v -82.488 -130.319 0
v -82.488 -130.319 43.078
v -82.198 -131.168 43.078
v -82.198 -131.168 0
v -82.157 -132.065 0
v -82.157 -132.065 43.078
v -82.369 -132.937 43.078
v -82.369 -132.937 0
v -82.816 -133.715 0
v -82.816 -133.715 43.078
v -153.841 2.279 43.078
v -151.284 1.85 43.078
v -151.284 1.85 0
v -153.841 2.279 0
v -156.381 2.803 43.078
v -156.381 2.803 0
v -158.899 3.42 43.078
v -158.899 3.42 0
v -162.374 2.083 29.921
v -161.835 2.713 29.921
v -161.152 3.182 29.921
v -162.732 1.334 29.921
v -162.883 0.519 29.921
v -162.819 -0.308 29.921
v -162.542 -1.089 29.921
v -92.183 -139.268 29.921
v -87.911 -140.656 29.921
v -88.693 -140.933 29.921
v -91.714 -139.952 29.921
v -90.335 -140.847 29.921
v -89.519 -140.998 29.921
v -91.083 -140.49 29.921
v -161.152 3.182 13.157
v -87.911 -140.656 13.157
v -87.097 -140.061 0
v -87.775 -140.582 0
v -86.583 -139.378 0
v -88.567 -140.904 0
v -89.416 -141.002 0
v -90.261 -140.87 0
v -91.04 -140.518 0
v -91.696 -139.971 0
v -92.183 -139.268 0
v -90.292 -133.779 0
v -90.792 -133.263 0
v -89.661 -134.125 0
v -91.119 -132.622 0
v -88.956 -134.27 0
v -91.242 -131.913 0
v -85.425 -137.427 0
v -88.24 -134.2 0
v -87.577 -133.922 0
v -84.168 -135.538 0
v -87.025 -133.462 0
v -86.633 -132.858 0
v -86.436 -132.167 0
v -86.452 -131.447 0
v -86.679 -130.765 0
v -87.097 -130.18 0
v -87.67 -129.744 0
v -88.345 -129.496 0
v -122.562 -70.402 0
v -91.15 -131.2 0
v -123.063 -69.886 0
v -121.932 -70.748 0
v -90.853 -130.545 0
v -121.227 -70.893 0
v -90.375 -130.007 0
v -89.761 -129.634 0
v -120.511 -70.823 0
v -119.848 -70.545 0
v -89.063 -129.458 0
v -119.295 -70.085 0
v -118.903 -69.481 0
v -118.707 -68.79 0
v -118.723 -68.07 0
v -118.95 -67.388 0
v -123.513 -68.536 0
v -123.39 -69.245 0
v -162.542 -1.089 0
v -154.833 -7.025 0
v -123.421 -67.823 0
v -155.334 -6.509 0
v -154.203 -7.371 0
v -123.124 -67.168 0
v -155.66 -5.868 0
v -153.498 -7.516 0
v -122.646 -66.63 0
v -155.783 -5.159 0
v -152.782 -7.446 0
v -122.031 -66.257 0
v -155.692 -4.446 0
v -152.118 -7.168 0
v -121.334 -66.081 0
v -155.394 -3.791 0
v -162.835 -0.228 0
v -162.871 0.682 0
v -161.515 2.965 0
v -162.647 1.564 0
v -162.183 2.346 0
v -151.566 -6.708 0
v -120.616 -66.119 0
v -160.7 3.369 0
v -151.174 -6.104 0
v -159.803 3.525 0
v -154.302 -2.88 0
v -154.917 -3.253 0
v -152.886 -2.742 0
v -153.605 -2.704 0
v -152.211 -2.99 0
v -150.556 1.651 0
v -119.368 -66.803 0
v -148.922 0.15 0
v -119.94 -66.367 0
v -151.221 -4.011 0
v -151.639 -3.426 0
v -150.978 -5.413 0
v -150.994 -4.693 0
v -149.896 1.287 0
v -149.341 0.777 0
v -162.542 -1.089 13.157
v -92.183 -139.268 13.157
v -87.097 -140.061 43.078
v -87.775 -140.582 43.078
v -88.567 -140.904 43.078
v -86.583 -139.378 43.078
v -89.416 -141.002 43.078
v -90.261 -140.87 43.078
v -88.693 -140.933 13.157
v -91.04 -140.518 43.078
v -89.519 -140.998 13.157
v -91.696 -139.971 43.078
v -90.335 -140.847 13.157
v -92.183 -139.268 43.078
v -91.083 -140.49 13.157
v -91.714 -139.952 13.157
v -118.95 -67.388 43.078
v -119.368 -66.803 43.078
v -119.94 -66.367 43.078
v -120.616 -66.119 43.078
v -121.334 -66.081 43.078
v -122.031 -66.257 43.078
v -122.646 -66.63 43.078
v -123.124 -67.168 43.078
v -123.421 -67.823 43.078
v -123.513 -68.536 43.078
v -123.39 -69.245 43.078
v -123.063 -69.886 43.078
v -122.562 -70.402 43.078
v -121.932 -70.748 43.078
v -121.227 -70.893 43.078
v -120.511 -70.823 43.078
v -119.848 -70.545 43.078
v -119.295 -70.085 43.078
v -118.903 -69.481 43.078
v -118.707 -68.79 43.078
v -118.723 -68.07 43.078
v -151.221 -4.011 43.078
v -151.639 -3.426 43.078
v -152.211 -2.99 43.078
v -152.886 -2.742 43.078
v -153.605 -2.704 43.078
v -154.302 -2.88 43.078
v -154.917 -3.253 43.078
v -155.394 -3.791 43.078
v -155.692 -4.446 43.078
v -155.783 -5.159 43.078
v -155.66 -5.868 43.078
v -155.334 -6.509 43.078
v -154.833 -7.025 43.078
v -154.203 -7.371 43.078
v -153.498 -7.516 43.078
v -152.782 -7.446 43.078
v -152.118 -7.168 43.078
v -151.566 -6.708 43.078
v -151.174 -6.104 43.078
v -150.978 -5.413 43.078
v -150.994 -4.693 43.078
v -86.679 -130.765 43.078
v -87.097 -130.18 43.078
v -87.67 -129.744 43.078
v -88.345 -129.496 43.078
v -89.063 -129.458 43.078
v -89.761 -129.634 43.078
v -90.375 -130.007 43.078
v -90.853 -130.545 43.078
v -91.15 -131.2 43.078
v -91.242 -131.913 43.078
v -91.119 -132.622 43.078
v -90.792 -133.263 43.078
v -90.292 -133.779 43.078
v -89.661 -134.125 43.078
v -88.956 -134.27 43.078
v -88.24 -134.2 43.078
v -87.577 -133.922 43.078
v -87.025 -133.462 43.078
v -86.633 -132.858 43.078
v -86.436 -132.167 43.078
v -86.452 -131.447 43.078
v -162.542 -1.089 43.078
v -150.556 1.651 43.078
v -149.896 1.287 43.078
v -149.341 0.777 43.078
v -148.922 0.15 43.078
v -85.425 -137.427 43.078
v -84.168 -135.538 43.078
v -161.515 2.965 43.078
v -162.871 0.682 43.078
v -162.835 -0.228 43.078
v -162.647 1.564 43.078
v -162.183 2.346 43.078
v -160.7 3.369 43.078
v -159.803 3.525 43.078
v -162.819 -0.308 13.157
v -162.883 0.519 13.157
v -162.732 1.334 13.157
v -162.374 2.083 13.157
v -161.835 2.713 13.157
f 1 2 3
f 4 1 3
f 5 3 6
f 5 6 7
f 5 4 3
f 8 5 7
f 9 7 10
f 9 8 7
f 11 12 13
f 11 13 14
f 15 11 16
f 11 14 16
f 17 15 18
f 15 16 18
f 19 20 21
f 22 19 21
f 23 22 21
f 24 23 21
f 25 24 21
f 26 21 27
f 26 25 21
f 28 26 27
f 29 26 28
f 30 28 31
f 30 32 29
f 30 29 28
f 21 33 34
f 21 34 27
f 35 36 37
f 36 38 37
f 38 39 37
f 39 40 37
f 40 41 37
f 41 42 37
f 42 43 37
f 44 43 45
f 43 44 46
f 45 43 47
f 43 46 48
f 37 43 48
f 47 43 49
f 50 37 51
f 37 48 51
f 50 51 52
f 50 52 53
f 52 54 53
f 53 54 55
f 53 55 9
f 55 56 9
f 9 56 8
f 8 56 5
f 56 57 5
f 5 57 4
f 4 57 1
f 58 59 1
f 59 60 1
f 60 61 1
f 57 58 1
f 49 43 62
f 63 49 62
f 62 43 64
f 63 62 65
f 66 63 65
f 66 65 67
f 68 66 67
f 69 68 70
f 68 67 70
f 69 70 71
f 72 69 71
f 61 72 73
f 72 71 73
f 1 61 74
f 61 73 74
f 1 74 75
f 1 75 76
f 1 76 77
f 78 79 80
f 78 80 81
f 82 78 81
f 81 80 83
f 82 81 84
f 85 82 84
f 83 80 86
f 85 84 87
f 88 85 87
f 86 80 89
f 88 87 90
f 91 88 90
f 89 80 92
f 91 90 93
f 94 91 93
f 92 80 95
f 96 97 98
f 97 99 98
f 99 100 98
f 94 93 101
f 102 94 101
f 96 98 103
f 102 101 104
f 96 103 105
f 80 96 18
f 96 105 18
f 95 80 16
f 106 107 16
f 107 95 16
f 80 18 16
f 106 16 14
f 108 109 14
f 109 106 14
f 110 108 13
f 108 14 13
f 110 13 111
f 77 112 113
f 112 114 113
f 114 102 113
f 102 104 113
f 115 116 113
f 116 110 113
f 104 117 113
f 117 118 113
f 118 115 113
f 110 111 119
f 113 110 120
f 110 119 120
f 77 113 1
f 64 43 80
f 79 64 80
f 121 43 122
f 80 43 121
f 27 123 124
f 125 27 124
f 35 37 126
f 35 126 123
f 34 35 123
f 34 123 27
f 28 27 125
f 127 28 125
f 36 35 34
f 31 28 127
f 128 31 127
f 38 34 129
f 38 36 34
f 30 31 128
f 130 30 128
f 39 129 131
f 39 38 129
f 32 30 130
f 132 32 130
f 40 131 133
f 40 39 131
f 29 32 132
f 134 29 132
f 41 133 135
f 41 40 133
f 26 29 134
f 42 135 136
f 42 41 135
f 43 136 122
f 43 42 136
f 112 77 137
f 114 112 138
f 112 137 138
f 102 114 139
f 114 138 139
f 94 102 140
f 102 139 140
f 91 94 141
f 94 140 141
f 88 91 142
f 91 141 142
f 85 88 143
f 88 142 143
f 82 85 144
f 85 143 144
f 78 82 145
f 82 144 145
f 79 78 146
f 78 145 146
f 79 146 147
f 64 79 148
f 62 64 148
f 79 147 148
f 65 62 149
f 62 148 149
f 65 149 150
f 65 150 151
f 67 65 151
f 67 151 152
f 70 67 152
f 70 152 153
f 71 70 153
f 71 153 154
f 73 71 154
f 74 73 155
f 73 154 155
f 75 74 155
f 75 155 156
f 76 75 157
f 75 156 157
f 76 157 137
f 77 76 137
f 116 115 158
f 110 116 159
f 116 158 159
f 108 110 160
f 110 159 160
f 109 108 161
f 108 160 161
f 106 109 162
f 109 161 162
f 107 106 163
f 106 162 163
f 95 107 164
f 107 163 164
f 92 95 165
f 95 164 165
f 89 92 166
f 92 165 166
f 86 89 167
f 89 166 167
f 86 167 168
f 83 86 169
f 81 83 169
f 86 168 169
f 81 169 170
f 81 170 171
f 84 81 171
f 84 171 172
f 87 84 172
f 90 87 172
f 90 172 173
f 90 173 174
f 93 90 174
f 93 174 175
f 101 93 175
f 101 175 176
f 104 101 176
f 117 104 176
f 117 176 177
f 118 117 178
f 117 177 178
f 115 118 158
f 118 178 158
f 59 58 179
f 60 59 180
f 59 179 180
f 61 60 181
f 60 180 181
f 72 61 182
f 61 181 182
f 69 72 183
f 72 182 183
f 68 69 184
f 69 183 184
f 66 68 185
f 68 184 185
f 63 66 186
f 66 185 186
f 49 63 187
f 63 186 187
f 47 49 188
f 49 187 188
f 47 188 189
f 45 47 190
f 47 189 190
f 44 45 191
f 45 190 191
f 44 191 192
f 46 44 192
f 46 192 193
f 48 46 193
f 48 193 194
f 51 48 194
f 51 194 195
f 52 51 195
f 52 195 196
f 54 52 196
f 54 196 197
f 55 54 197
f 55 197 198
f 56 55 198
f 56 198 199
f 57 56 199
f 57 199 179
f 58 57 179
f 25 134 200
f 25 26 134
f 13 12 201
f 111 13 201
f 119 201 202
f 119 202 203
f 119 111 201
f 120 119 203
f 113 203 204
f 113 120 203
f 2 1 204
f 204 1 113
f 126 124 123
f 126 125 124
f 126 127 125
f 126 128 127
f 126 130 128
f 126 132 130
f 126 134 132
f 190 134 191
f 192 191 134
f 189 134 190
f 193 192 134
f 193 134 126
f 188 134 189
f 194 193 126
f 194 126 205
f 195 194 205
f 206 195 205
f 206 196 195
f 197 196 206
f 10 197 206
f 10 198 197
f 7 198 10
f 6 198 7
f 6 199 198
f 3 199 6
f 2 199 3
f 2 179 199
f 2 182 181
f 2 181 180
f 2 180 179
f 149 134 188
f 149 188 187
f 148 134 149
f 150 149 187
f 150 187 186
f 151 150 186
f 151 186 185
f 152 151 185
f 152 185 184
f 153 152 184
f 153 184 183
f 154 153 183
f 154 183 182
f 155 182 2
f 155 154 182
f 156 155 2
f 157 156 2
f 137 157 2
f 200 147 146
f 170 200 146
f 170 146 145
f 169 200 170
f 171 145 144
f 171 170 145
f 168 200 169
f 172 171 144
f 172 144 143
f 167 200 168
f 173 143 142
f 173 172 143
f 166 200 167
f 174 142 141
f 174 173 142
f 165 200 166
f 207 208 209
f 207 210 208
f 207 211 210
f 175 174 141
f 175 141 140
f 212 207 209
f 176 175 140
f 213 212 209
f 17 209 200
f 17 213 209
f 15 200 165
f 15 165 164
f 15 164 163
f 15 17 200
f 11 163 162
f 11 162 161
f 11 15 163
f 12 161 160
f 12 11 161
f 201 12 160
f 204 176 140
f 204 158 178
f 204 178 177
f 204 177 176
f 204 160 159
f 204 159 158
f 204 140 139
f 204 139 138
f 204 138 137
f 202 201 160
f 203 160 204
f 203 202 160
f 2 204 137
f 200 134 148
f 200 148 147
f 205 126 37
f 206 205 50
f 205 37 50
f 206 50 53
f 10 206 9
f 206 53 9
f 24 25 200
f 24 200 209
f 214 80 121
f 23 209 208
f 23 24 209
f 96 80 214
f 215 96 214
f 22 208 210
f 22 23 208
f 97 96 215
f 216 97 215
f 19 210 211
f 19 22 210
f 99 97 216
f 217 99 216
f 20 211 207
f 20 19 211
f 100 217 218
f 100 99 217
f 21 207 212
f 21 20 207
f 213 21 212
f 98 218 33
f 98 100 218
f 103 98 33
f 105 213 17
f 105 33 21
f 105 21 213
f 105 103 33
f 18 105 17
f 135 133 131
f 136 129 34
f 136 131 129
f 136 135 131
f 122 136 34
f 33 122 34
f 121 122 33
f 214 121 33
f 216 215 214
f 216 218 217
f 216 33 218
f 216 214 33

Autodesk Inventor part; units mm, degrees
ref_plane "Work Plane1" through (-105.5469, -33.8995, 0) normal (0, 0, 1) x (1, 0, 0)
sketch "Sketch1" plane through (-105.5469, -33.8995, 0) normal (0, 0, 1) x (1, 0, 0)
  circle A0 centre (51.4164, 20.6909) radius 2.413 projected
  circle A1 centre (61.5426, -29.0897) radius 2.413 projected
  circle A2 centre (41.2902, 70.4714) radius 2.413 projected
  circle A3 centre (71.6688, -78.8702) radius 2.413 projected
  circle A4 centre (27.8827, -36.0288) radius 3.175 projected
  line L0 (21.5564, -145.7309) -> (-91.4082, 76.2381) projected
  line L1 (59.5069, 74.2446) -> (98.755, -118.7966) projected
  line L2 (15.2228, 144.056) -> (44.9436, 105.9012) projected
  line L3 (63.6348, -131.723) -> (58.903, -119.9375) projected
  line L4 (53.0129, -122.3028) -> (57.7447, -134.0883) projected
  arc A5 (3.7348, 135.3868) -> (-79.7406, 82.2913) centre (-35.4587, 104.8391) ccw
  line L5 (3.7348, 135.3868) -> (33.4679, 97.2384)
  arc A6 (45.3974, 71.3204) -> (33.4679, 97.2384) centre (-15.7425, 58.8835) ccw
  line L6 (45.3974, 71.3204) -> (84.6647, -121.7179)
  arc A7 (33.2723, -139.6562) -> (84.6647, -121.7179) centre (57.7489, -127.193) ccw
  arc A8 (2.9524, 134.777) -> (-78.8566, 82.7414) centre (-35.4587, 104.8391) ccw
  line L7 (2.9524, 134.777) -> (32.6855, 96.6286)
  arc A9 (44.4253, 71.1227) -> (32.6855, 96.6286) centre (-15.7425, 58.8835) ccw
  line L8 (44.4253, 71.1227) -> (83.6926, -121.9156)
  arc A10 (34.1563, -139.2061) -> (83.6926, -121.9156) centre (57.7489, -127.193) ccw
  line L9 (34.1563, -139.2061) -> (-78.8566, 82.7414)
  arc A11 (-4.5602, 128.9216) -> (-70.3686, 87.0634) centre (-35.4587, 104.8391) ccw
  line L10 (-4.5602, 128.9216) -> (25.1729, 90.7732)
  arc A12 (35.0915, 69.224) -> (25.1729, 90.7732) centre (-15.7425, 58.8835) ccw
  line L11 (35.0915, 69.224) -> (74.3588, -123.8143)
  arc A13 (42.6443, -134.8841) -> (74.3588, -123.8143) centre (57.7489, -127.193) ccw
  line L12 (42.6443, -134.8841) -> (-70.3686, 87.0634)
  arc A14 (5.4566, 136.7288) -> (-81.686, 81.3007) centre (-35.4587, 104.8391) ccw
  line L13 (5.4566, 136.7288) -> (35.1897, 98.5804)
  arc A15 (47.5366, 71.7556) -> (35.1897, 98.5804) centre (-15.7425, 58.8835) ccw
  line L14 (47.5366, 71.7556) -> (86.8039, -121.2827)
  arc A16 (31.327, -140.6467) -> (86.8039, -121.2827) centre (57.7489, -127.193) ccw
  line L15 (31.327, -140.6467) -> (-81.686, 81.3007)
  circle A17 centre (57.7489, -127.193) radius 44.45
  circle A18 centre (-35.4587, 104.8391) radius 69.85
  circle A19 centre (-47.8242, 28.7936) radius 2.413 projected
  circle A20 centre (-15.5534, -34.5834) radius 2.413 projected
  circle A21 centre (16.7174, -97.9605) radius 2.413 projected
  line L16 (-33.1344, 24.0942) -> (34.7456, 18.5458) projected
  line L17 (36.5081, 12.9323) -> (-6.2049, -22.3208) projected
  line L18 (-20.7511, -20.2117) -> (-39.1333, 15.9083) projected
  line L19 (38.3036, 25.8999) -> (-20.4951, 30.706) projected
  line L20 (-21.5821, 36.7465) -> (30.7819, 61.2351) projected
  line L21 (44.0707, 55.5202) -> (48.097, 35.7165) projected
  line L22 (-53.0081, 43.1715) -> (-61.3301, 59.5239) projected
  line L23 (17.8998, 109.9146) -> (30.1007, 94.2514) projected
  line L24 (27.5547, 68.1378) -> (-5.8444, 52.5185) projected
  line L25 (27.1825, -114.3985) -> (25.3807, -110.8581) projected
  line L26 (32.1964, -96.6363) -> (38.137, -94.5724) projected
  line L27 (74.4344, -93.8236) -> (75.2107, -97.6416) projected
  line L28 (50.495, -96.7953) -> (49.4394, -94.1661) projected
  line L29 (51.3425, -89.9843) -> (60.23, -86.8964) projected
  line L30 (-10.1341, 54.212) -> (-12.6231, 60.4113) projected
  line L31 (-19.6913, 57.573) -> (-16.9128, 50.6526) projected
  line L32 (-18.5132, 46.5938) -> (-35.734, 38.5403) projected
  line L33 (42.124, -96.3889) -> (43.4268, -99.6336) projected
  arc A22 (40.3328, 7.2327) -> (41.7343, 8.6241) centre (33.4597, 15.5569) ccw projected
  arc A23 (45.6191, 9.409) -> (41.7343, 8.6241) centre (44.1679, 6.585) ccw projected
  arc A24 (45.6191, 9.409) -> (50.3997, 8.0475) centre (51.4164, 20.6909) ccw projected
  arc A25 (53.2564, 5.5162) -> (50.3997, 8.0475) centre (50.1452, 4.8827) ccw projected
  line L34 (53.2564, 5.5162) -> (57.2026, -13.8642) projected
  arc A26 (55.534, -17.3261) -> (57.2026, -13.8642) centre (54.0915, -14.4977) ccw projected
  arc A27 (55.534, -17.3261) -> (49.5198, -23.895) centre (61.311, -28.6529) ccw projected
  arc A28 (46.8024, -25.8738) -> (49.5198, -23.895) centre (46.5755, -22.7069) ccw projected
  line L35 (46.8024, -25.8738) -> (37.6772, -26.5277) projected
  arc A29 (35.5367, -25.8944) -> (37.6772, -26.5277) centre (37.4502, -23.3608) ccw projected
  arc A30 (35.5367, -25.8944) -> (18.8618, -27.0893) centre (27.8827, -36.0288) ccw projected
  arc A31 (16.8336, -28.0213) -> (18.8618, -27.0893) centre (16.6066, -24.8545) ccw projected
  line L36 (16.8336, -28.0213) -> (0.7655, -29.1728) projected
  arc A32 (-0.3587, -26.3652) -> (0.7655, -29.1728) centre (0.652, -27.5893) ccw projected
  line L37 (-0.3587, -26.3652) -> (40.3328, 7.2327) projected
  arc A33 (12.0706, -61.7398) -> (8.1483, -51.9706) centre (20.8352, -52.5488) ccw projected
  line L38 (25.9855, -70.6908) -> (17.4507, -83.8024) projected
  line L39 (11.5059, -83.5949) -> (-6.8763, -47.4749) projected
  line L40 (-0.2859, -37.1185) -> (-0.1921, -37.1119) projected
  line L41 (74.8789, -123.628) -> (78.6564, -122.8604) projected
  line L42 (0.38, 132.4063) -> (2.0588, 130.251) projected
  line L43 (38.7029, -137.0353) -> (37.8849, -135.428) projected
  line L44 (38.579, -133.2932) -> (44.3373, -130.3617) projected
  line L45 (12.0706, -61.7398) -> (13.7631, -65.9552) projected
  line L46 (17.8911, -67.7189) -> (22.1428, -66.0115) projected
  line L47 (2.9792, -39.0961) -> (8.1483, -51.9706) projected
  ellipse E0 centre (-34.8429, 105.035) end of major axis (-54.1736, 165.5211) minor radius 63.4728 (15.2228, 144.056) -> (-91.4082, 76.2381) ccw projected
  ellipse E1 centre (58.3238, -127.0129) end of major axis (45.7589, -87.6969) minor radius 41.2573 (21.5564, -145.7309) -> (98.755, -118.7966) ccw projected
  ellipse E2 centre (-15.1352, 59.076) end of major axis (-38.3321, 131.6593) minor radius 76.1674 (59.5069, 74.2446) -> (44.9436, 105.9012) ccw projected
  ellipse E3 centre (-34.8429, 105.035) end of major axis (-38.9507, 117.8883) minor radius 13.488 projected
  ellipse E4 centre (60.6898, -132.9057) end of major axis (59.7232, -129.8814) minor radius 3.1736 (57.7447, -134.0883) -> (63.6348, -131.723) ccw projected
  ellipse E5 centre (55.9579, -121.1202) end of major axis (54.9914, -118.0958) minor radius 3.1736 (58.903, -119.9375) -> (53.0129, -122.3028) ccw projected
  ellipse E6 centre (-47.0283, 29.0524) end of major axis (-50.8944, 41.1496) minor radius 12.6946 (-38.4497, 19.689) -> (-36.1193, 22.5544) ccw projected
  ellipse E7 centre (-33.3921, 20.9299) end of major axis (-34.3586, 23.9542) minor radius 3.1736 (-33.1344, 24.0942) -> (-36.1193, 22.5544) ccw projected
  ellipse E8 centre (34.4879, 15.3814) end of major axis (33.5214, 18.4057) minor radius 3.1736 (36.5081, 12.9323) -> (34.7456, 18.5458) ccw projected
  ellipse E9 centre (-8.2251, -19.8717) end of major axis (-7.2586, -22.896) minor radius 3.1736 (-9.5343, -22.7635) -> (-6.2049, -22.3208) ccw projected
  ellipse E10 centre (-14.7713, -34.3308) end of major axis (-18.6374, -22.2336) minor radius 12.6946 (-9.5343, -22.7635) -> (-17.2925, -21.8836) ccw projected
  ellipse E11 centre (-17.9228, -18.7718) end of major axis (-16.9563, -21.7962) minor radius 3.1736 (-20.7511, -20.2117) -> (-17.2925, -21.8836) ccw projected
  ellipse E12 centre (-36.305, 17.3481) end of major axis (-35.3385, 14.3238) minor radius 3.1736 (-38.4497, 19.689) -> (-39.1333, 15.9083) ccw projected
  ellipse E13 centre (38.5613, 29.0642) end of major axis (39.5278, 26.0399) minor radius 3.1736 (38.3036, 25.8999) -> (41.2885, 27.4397) ccw projected
  ellipse E14 centre (-20.2374, 33.8704) end of major axis (-19.2708, 30.8461) minor radius 3.1736 (-21.5821, 36.7465) -> (-20.4951, 30.706) ccw projected
  ellipse E15 centre (32.1266, 58.3589) end of major axis (31.1601, 61.3832) minor radius 3.1736 (34.1165, 60.8317) -> (30.7819, 61.2351) ccw projected
  ellipse E16 centre (42.0762, 70.723) end of major axis (38.2101, 82.8202) minor radius 12.6946 (34.1165, 60.8317) -> (41.1837, 58.0551) ccw projected
  ellipse E17 centre (40.9606, 54.8882) end of major axis (39.994, 57.9125) minor radius 3.1736 (44.0707, 55.5202) -> (41.1837, 58.0551) ccw projected
  ellipse E18 centre (44.9869, 35.0845) end of major axis (44.0204, 38.1088) minor radius 3.1736 (46.4291, 32.2559) -> (48.097, 35.7165) ccw projected
  ellipse E19 centre (-37.0786, 41.4165) end of major axis (-36.1121, 38.3922) minor radius 3.1736 (-39.0686, 38.9437) -> (-35.734, 38.5403) ccw projected
  ellipse E20 centre (-47.0283, 29.0524) end of major axis (-50.8944, 41.1496) minor radius 12.6946 (-39.0686, 38.9437) -> (-49.5495, 41.4996) ccw projected
  ellipse E21 centre (-50.1798, 44.6113) end of major axis (-49.2133, 41.587) minor radius 3.1736 (-53.0081, 43.1715) -> (-49.5495, 41.4996) ccw projected
  ellipse E22 centre (-58.5019, 60.9637) end of major axis (-57.5353, 57.9394) minor radius 3.1736 (-56.9933, 63.7566) -> (-61.3301, 59.5239) ccw projected
  ellipse E23 centre (-34.666, 105.0915) end of major axis (-48.9707, 149.8513) minor radius 46.9699 (-11.2596, 64.347) -> (12.228, 107.7818) ccw projected
  ellipse E24 centre (15.3966, 107.9636) end of major axis (14.43, 110.9879) minor radius 3.1736 (17.8998, 109.9146) -> (12.228, 107.7818) ccw projected
  ellipse E25 centre (-14.9584, 59.1325) end of major axis (2.4393, 4.6949) minor radius 57.1256 (35.8618, 85.223) -> (30.1007, 94.2514) ccw projected
  ellipse E26 centre (33.0385, 83.7735) end of major axis (32.0719, 86.7978) minor radius 3.1736 (34.846, 81.1634) -> (35.8618, 85.223) ccw projected
  ellipse E27 centre (42.0762, 70.723) end of major axis (38.2101, 82.8202) minor radius 12.6946 (34.846, 81.1634) -> (29.3832, 70.9558) ccw projected
  ellipse E28 centre (26.21, 71.014) end of major axis (25.2435, 74.0383) minor radius 3.1736 (27.5547, 68.1378) -> (29.3832, 70.9558) ccw projected
  ellipse E29 centre (58.5007, -126.9564) end of major axis (49.8019, -99.7376) minor radius 28.5628 (70.7406, -101.1419) -> (53.9461, -98.747) ccw projected
  ellipse E30 centre (30.0108, -112.9586) end of major axis (30.9773, -115.9829) minor radius 3.1736 (27.1825, -114.3985) -> (32.8598, -114.3584) ccw projected
  ellipse E31 centre (28.209, -109.4182) end of major axis (29.1755, -112.4425) minor radius 3.1736 (26.0643, -107.0774) -> (25.3807, -110.8581) ccw projected
  ellipse E32 centre (17.4857, -97.714) end of major axis (21.3519, -109.8112) minor radius 12.6946 (26.0643, -107.0774) -> (30.0878, -99.2512) ccw projected
  ellipse E33 centre (33.2384, -99.6355) end of major axis (34.2049, -102.6598) minor radius 3.1736 (32.1964, -96.6363) -> (30.0878, -99.2512) ccw projected
  ellipse E34 centre (61.272, -89.8956) end of major axis (60.3054, -86.8713) minor radius 3.1736 (63.5056, -87.6406) -> (60.23, -86.8964) ccw projected
  ellipse E35 centre (72.44, -78.6208) end of major axis (68.5739, -66.5236) minor radius 12.6946 (63.5056, -87.6406) -> (71.5475, -91.2887) ccw projected
  ellipse E36 centre (71.3244, -94.4556) end of major axis (70.3578, -91.4313) minor radius 3.1736 (74.4344, -93.8236) -> (71.5475, -91.2887) ccw projected
  ellipse E37 centre (72.1006, -98.2736) end of major axis (73.0671, -101.2979) minor radius 3.1736 (70.7406, -101.1419) -> (75.2107, -97.6416) ccw projected
  ellipse E38 centre (58.5007, -126.9564) end of major axis (49.8019, -99.7376) minor radius 28.5628 (42.2836, -103.4303) -> (32.8598, -114.3584) ccw projected
  ellipse E39 centre (-34.666, 105.0915) end of major axis (-48.9707, 149.8513) minor radius 46.9699 (-56.9933, 63.7566) -> (-23.3977, 59.4727) ccw projected
  ellipse E40 centre (53.44, -95.6126) end of major axis (54.4066, -98.6369) minor radius 3.1736 (50.495, -96.7953) -> (53.9461, -98.747) ccw projected
  ellipse E41 centre (52.3844, -92.9835) end of major axis (53.351, -96.0078) minor radius 3.1736 (51.3425, -89.9843) -> (49.4394, -94.1661) ccw projected
  ellipse E42 centre (-7.1891, 55.3946) end of major axis (-6.2225, 52.3703) minor radius 3.1736 (-10.1341, 54.212) -> (-5.8444, 52.5185) ccw projected
  ellipse E43 centre (-9.6781, 61.594) end of major axis (-8.7115, 58.5697) minor radius 3.1736 (-11.2596, 64.347) -> (-12.6231, 60.4113) ccw projected
  ellipse E44 centre (-19.8578, 49.4699) end of major axis (-20.8244, 52.4943) minor radius 3.1736 (-18.5132, 46.5938) -> (-16.9128, 50.6526) ccw projected
  ellipse E45 centre (-22.6364, 56.3903) end of major axis (-23.6029, 59.4146) minor radius 3.1736 (-19.6913, 57.573) -> (-23.3977, 59.4727) ccw projected
  ellipse E46 centre (39.179, -97.5715) end of major axis (38.2124, -94.5472) minor radius 3.1736 (42.124, -96.3889) -> (38.137, -94.5724) ccw projected
  ellipse E47 centre (40.4817, -100.8163) end of major axis (39.5152, -97.792) minor radius 3.1736 (42.2836, -103.4303) -> (43.4268, -99.6336) ccw projected
  ellipse E48 centre (14.791, -82.0695) end of major axis (15.7575, -85.0938) minor radius 3.1736 (15.3299, -85.1984) -> (17.4507, -83.8024) ccw projected
  ellipse E49 centre (17.4857, -97.714) end of major axis (13.6196, -85.6168) minor radius 12.6946 (15.3299, -85.1984) -> (14.9645, -85.2668) ccw projected
  ellipse E50 centre (14.3342, -82.155) end of major axis (15.3007, -85.1793) minor radius 3.1736 (11.5059, -83.5949) -> (14.9645, -85.2668) ccw projected
  ellipse E51 centre (-4.048, -46.035) end of major axis (-3.0815, -49.0593) minor radius 3.1736 (-6.1927, -43.6942) -> (-6.8763, -47.4749) ccw projected
  ellipse E52 centre (-14.7713, -34.3308) end of major axis (-10.9051, -46.428) minor radius 12.6946 (-6.1927, -43.6942) -> (-3.002, -39.0945) ccw projected
  ellipse E53 centre (-0.0597, -40.2854) end of major axis (-1.0262, -37.2611) minor radius 3.1736 (-0.2859, -37.1185) -> (-3.002, -39.0945) ccw projected
  ellipse E54 centre (-75.9068, 106.3278) end of major axis (-76.8733, 109.3521) minor radius 3.1736 (-73.3969, 108.2703) -> (-79.0792, 106.4229) ccw projected
  ellipse E55 centre (-58.3372, 119.9252) end of major axis (-64.1365, 138.071) minor radius 19.0419 (-73.3969, 108.2703) -> (-70.1692, 105.0022) ccw projected
  ellipse E56 centre (-72.1411, 102.5151) end of major axis (-73.1077, 105.5394) minor radius 3.1736 (-69.8464, 100.3213) -> (-70.1692, 105.0022) ccw projected
  ellipse E57 centre (-56.078, 87.1583) end of major axis (-61.8772, 105.3042) minor radius 19.0419 (-69.8464, 100.3213) -> (-72.5951, 96.6423) ccw projected
  ellipse E58 centre (-75.348, 98.223) end of major axis (-74.3814, 95.1987) minor radius 3.1736 (-78.4773, 97.6947) -> (-72.5951, 96.6423) ccw projected
  ellipse E59 centre (-34.666, 105.0915) end of major axis (-21.1345, 62.7512) minor radius 44.431 (-79.0792, 106.4229) -> (-78.4773, 97.6947) ccw projected
  ellipse E60 centre (-46.2445, 144.7092) end of major axis (-47.211, 147.7336) minor radius 3.1736 (-43.6215, 142.9211) -> (-47.1351, 147.7568) ccw projected
  ellipse E61 centre (-27.8837, 132.1924) end of major axis (-33.6829, 150.3383) minor radius 19.0419 (-43.6215, 142.9211) -> (-45.7303, 138.8412) ccw projected
  ellipse E62 centre (-48.7048, 139.9494) end of major axis (-47.7382, 136.925) minor radius 3.1736 (-50.0809, 137.0888) -> (-45.7303, 138.8412) ccw projected
  ellipse E63 centre (-58.3372, 119.9252) end of major axis (-64.1365, 138.071) minor radius 19.0419 (-50.0809, 137.0888) -> (-54.4286, 138.5679) ccw projected
  ellipse E64 centre (-53.7771, 141.675) end of major axis (-52.8106, 138.6507) minor radius 3.1736 (-55.2472, 144.4891) -> (-54.4286, 138.5679) ccw projected
  ellipse E65 centre (-34.666, 105.0915) end of major axis (-21.1345, 62.7512) minor radius 44.431 (-47.1351, 147.7568) -> (-55.2472, 144.4891) ccw projected
  ellipse E66 centre (78.9727, -124.4161) end of major axis (78.4894, -122.9039) minor radius 1.5868 (80.5474, -124.2206) -> (78.6564, -122.8604) ccw projected
  ellipse E67 centre (58.5007, -126.9564) end of major axis (51.735, -105.7862) minor radius 22.2155 (79.7691, -133.3844) -> (80.5474, -124.2206) ccw projected
  ellipse E68 centre (76.7308, -132.4661) end of major axis (77.6973, -135.4904) minor radius 3.1736 (73.5579, -132.5427) -> (79.7691, -133.3844) ccw projected
  ellipse E69 centre (60.8666, -132.8492) end of major axis (64.7328, -144.9464) minor radius 12.6946 (73.5579, -132.5427) -> (72.5825, -127.9613) ccw projected
  ellipse E70 centre (75.5115, -126.7394) end of major axis (74.545, -123.7151) minor radius 3.1736 (74.8789, -123.628) -> (72.5825, -127.9613) ccw projected
  ellipse E71 centre (-0.4445, 128.2999) end of major axis (0.522, 125.2756) minor radius 3.1736 (-1.3529, 125.2581) -> (2.0588, 130.251) ccw projected
  ellipse E72 centre (-6.8031, 107.0071) end of major axis (-12.6023, 125.153) minor radius 19.0419 (-1.3529, 125.2581) -> (-6.001, 126.0393) ccw projected
  ellipse E73 centre (-5.8673, 129.2113) end of major axis (-4.9008, 126.187) minor radius 3.1736 (-9.0125, 129.6372) -> (-6.001, 126.0393) ccw projected
  ellipse E74 centre (-27.8837, 132.1924) end of major axis (-33.6829, 150.3383) minor radius 19.0419 (-9.0125, 129.6372) -> (-8.9508, 134.2302) ccw projected
  ellipse E75 centre (-5.7954, 134.5699) end of major axis (-6.7619, 137.5942) minor radius 3.1736 (-3.5745, 136.8374) -> (-8.9508, 134.2302) ccw projected
  ellipse E76 centre (-34.666, 105.0915) end of major axis (-21.1345, 62.7512) minor radius 44.431 (0.38, 132.4063) -> (-3.5745, 136.8374) ccw projected
  ellipse E77 centre (39.299, -134.708) end of major axis (39.7823, -136.2202) minor radius 1.5868 (38.579, -133.2932) -> (37.8849, -135.428) ccw projected
  ellipse E78 centre (45.0573, -131.7765) end of major axis (44.5741, -130.2644) minor radius 1.5868 (46.551, -131.2409) -> (44.3373, -130.3617) ccw projected
  ellipse E79 centre (58.5007, -126.9564) end of major axis (54.6346, -114.8592) minor radius 12.6946 (46.551, -131.2409) -> (48.2775, -134.4832) ccw projected
  ellipse E80 centre (60.8666, -132.8492) end of major axis (64.7328, -144.9464) minor radius 12.6946 (48.2775, -134.4832) -> (51.4877, -141.4055) ccw projected
  ellipse E81 centre (49.1429, -143.5446) end of major axis (48.1764, -140.5202) minor radius 3.1736 (47.5833, -146.3092) -> (51.4877, -141.4055) ccw projected
  ellipse E82 centre (58.5007, -126.9564) end of major axis (51.735, -105.7862) minor radius 22.2155 (38.7029, -137.0353) -> (47.5833, -146.3092) ccw projected
  ellipse E83 centre (52.1975, 20.9417) end of major axis (48.3314, 33.0389) minor radius 12.6946 (46.4291, 32.2559) -> (41.2885, 27.4397) ccw projected
  ellipse E84 centre (16.7081, -64.7725) end of major axis (17.6747, -67.7968) minor radius 3.1736 (13.7631, -65.9552) -> (17.8911, -67.7189) ccw projected
  ellipse E85 centre (23.3258, -68.9579) end of major axis (22.3593, -65.9336) minor radius 3.1736 (25.9855, -70.6908) -> (22.1428, -66.0115) ccw projected
  ellipse E86 centre (0.0342, -40.2787) end of major axis (-0.9324, -37.2544) minor radius 3.1736 (2.9792, -39.0961) -> (-0.1921, -37.1119) ccw projected
  ellipse E87 centre (45.8902, -59.8967) end of major axis (44.9237, -56.8724) minor radius 3.1736 (44.7072, -56.9504) -> (43.2305, -58.1638) ccw projected
  line L48 (44.7072, -56.9504) -> (46.8705, -56.0816) projected
  ellipse E88 centre (45.6876, -53.1353) end of major axis (44.721, -50.111) minor radius 3.1736 (46.8705, -56.0816) -> (48.6792, -52.0758) ccw projected
  ellipse E89 centre (51.6707, -51.0164) end of major axis (50.7042, -47.9921) minor radius 3.1736 (49.011, -49.2835) -> (48.6792, -52.0758) ccw projected
  line L49 (49.011, -49.2835) -> (53.8355, -41.872) projected
  line L50 (25.969, -84.6816) -> (43.2305, -58.1638) projected
  ellipse E90 centre (-17.6922, -49.6994) end of major axis (-15.8961, -55.3194) minor radius 5.8975 (-22.8057, -52.6378) -> (-14.6753, -44.6307) ccw projected
  ellipse E91 centre (-17.6417, -49.6706) end of major axis (-16.9644, -51.79) minor radius 2.224 projected
  ellipse E92 centre (56.4952, -43.6049) end of major axis (55.5287, -40.5806) minor radius 3.1736 (57.6599, -40.6518) -> (53.8355, -41.872) ccw projected
  ellipse E93 centre (62.3188, -28.8395) end of major axis (58.4526, -16.7423) minor radius 12.6946 (57.6599, -40.6518) -> (61.4262, -41.5074) ccw projected
  ellipse E94 centre (61.2031, -44.6744) end of major axis (60.2366, -41.6501) minor radius 3.1736 (64.3132, -44.0423) -> (61.4262, -41.5074) ccw projected
  line L51 (64.3132, -44.0423) -> (68.3396, -63.846) projected
  ellipse E95 centre (65.2295, -64.478) end of major axis (64.2629, -61.4537) minor radius 3.1736 (66.6716, -67.3066) -> (68.3396, -63.846) ccw projected
  ellipse E96 centre (72.44, -78.6208) end of major axis (68.5739, -66.5236) minor radius 12.6946 (66.6716, -67.3066) -> (59.8379, -77.0836) ccw projected
  ellipse E97 centre (56.6874, -76.6993) end of major axis (55.7209, -73.675) minor radius 3.1736 (57.7293, -79.6984) -> (59.8379, -77.0836) ccw projected
  line L52 (57.7293, -79.6984) -> (29.6957, -89.4384) projected
  ellipse E98 centre (28.6538, -86.4392) end of major axis (29.6203, -89.4635) minor radius 3.1736 (26.4202, -88.6942) -> (29.6957, -89.4384) ccw projected
  ellipse E99 centre (17.4857, -97.714) end of major axis (21.3519, -109.8112) minor radius 12.6946 (26.4202, -88.6942) -> (26.4002, -88.6744) ccw projected
  ellipse E100 centre (28.6288, -86.4145) end of major axis (27.6622, -83.3902) minor radius 3.1736 (25.969, -84.6816) -> (26.4002, -88.6744) ccw projected
  point P0 (105.5469, 33.8995)
  point P1 (-44.128, 35.5292)
  point P2 (-60.4612, 39.6172)
  point P3 (16.3005, -111.136)
  point P4 (23.999, -98.2664)
  point P5 (-35.4703, 104.8623)
  point P6 (57.7373, -127.1698)
  dimension "d0" = 12.7
  dimension "d1" = 9.525
  dimension "d2" = 88.9
  dimension "d3" = 139.7
ref_plane "Work Plane2" through (-41.9854, -105.2288, 43.0784) normal (0, 0, 1) x (1, 0, 0)
extrude "Extrusion1" add sketch "Sketch1" along normal up to surface (43.0784 mm away) contours L15 E90 L9 A17 | A18 L9 E90 L15 | L9 E90 A18 L12 E6 E12 L18 E11 E10 E52 E51 L39 E50 E49 E48 A17 | L9 E90 | E48 E49 E50 L39 E51 E52 L12 | L12 E10 E11 L18 E12 E6 | A19 | A20 | A21
sketch "Sketch2" plane through (-166.0081, 5.7177, 0) normal (-0.8911282, -0.4537516, 0) x (0, 0, 1)
  spline S0 degree 3 number of poles 454
  line L0 (43.0784, -169.1712) -> (43.0784, 0)
  line L1 (0, 0) -> (43.0784, 0)
  line L2 (0, 0) -> (0, -169.1712)
  line L3 (0, -169.1712) -> (43.0784, -169.1712)
  line L4 (13.1572, -174.2662) -> (29.9212, -174.2662)
  line L5 (13.1572, -174.2662) -> (13.1572, -19.5178)
  line L6 (13.1572, -19.5178) -> (29.9212, -19.5178)
  line L7 (29.9212, -19.5178) -> (29.9212, -174.2662)
  line L8 (13.1572, -19.5178) -> (13.1572, 0)
  line L9 (29.9212, -19.5178) -> (29.9212, 0)
  point P0 (0, -80.4217)
  point P1 (13.1572, -169.1712)
  point P2 (29.9212, -169.1712)
extrude "Extrusion2" cut sketch "Sketch2" against normal blind 3.175 contours L3 L5 L6 L7 | L9 L6 L8 L1
fillet "Fillet1" radius 3.175 5 edges at (-89.2464, -145.0355, 6.5786) (-89.2464, -145.0355, 36.4998) (-81.5478, -132.1659, 21.5392) (-149.6749, 1.6297, 21.5392) (-166.0081, 5.7177, 6.5786)
sketch "Sketch3" plane through (-92.183, -139.2682, 43.0784) normal (0, 0, 1) x (0.8911282, 0.4537516, 0)
  line L0 (6.35, 5.08) -> (6.35, 156.499)
  arc A0 (5.2924, 157.4265) -> (11.3663, 152.5714) centre (51.875, 209.4754) ccw projected
  circle A1 centre (6.35, 5.08) radius 2.413
  arc A2 (0, 0) -> (4.94, -2.6392) centre (3.175, 0) ccw projected
  circle A3 centre (6.35, 76.2) radius 2.413
  circle A4 centre (6.35, 147.32) radius 2.413
  point P0 (145.3401, 82.2776)
  dimension "d9" = 4.826
  dimension "d10" = 5.08
  dimension "d13" = 71.12
ref_plane "Work Plane3" through (-228.5882, -244.5835, 0) normal (0, 0, 1) x (1, 0, 0)
extrude "Extrusion3" cut sketch "Sketch3" against normal up to surface (43.0784 mm away)
thread "Thread1" size "10-24 UNC" class "2B" standard "ANSI Unified Screw Threads" full length
thread "Thread2" size "10-24 UNC" class "2B" standard "ANSI Unified Screw Threads" full length
thread "Thread3" size "10-24 UNC" class "2B" standard "ANSI Unified Screw Threads" full length
sketch "Sketch4" plane through (-148.9216, 0.1502, 43.0784) normal (0.8911282, 0.4537516, 0) x (0, 0, -1)
  line L0 (0, 0) -> (43.0784, 0) projected
  line L1 (0, 0) -> (0, -146.409) projected
  line L2 (43.0784, -146.409) -> (0, -146.409) projected
  line L3 (43.0784, -146.409) -> (43.0784, 0) projected
  line L4 (0, 2.5865) -> (0, 0) projected
  line L5 (0, 0) -> (43.0784, 0) projected
  line L6 (43.0784, 0) -> (43.0784, 2.5865) projected
  line L7 (43.0784, 2.5865) -> (0, 2.5865) projected
  line L8 (13.1572, 5.0759) -> (0, 5.0759) projected
  line L9 (0, 5.0759) -> (0, 7.4417) projected
  line L10 (0, 7.4417) -> (43.0784, 7.4417) projected
  line L11 (43.0784, 7.4417) -> (43.0784, 5.0759) projected
  line L12 (43.0784, 5.0759) -> (29.9212, 5.0759) projected
  line L13 (29.9212, 5.0759) -> (29.9212, 8.2509) projected
  line L14 (29.9212, 8.2509) -> (13.1572, 8.2509) projected
  line L15 (13.1572, 8.2509) -> (13.1572, 5.0759) projected
  line L16 (13.1572, 5.0759) -> (0, 5.0759) projected
  line L17 (0, 7.4417) -> (43.0784, 7.4417) projected
  line L18 (0, 7.4417) -> (0, 2.5865) projected
  line L19 (43.0784, 2.5865) -> (0, 2.5865) projected
  line L20 (43.0784, 2.5865) -> (43.0784, 7.4417) projected
  line L21 (0, -152.624) -> (0, -149.9848) projected
  line L22 (0, -149.9848) -> (13.1572, -149.9848) projected
  line L23 (13.1572, -149.9848) -> (13.1572, -153.1598) projected
  line L24 (13.1572, -153.1598) -> (29.9212, -153.1598) projected
  line L25 (29.9212, -153.1598) -> (29.9212, -149.9848) projected
  line L26 (43.0784, -149.9848) -> (29.9212, -149.9848) projected
  line L27 (43.0784, -149.9848) -> (43.0784, -152.624) projected
  line L28 (43.0784, -152.624) -> (0, -152.624) projected
  line L29 (0, -149.2865) -> (43.0784, -149.2865) projected
  line L30 (0, -149.2865) -> (0, -152.624) projected
  line L31 (43.0784, -152.624) -> (0, -152.624) projected
  line L32 (43.0784, -152.624) -> (43.0784, -149.2865) projected
  line L33 (0, -146.409) -> (0, -149.2865) projected
  line L34 (0, -149.2865) -> (43.0784, -149.2865) projected
  line L35 (43.0784, -149.2865) -> (43.0784, -146.409) projected
  line L36 (43.0784, -146.409) -> (0, -146.409) projected
  line L37 (43.0784, -153.1598) -> (0, -153.1598) projected
  line L38 (0, -152.624) -> (0, -149.9848) projected
  line L39 (0, -149.9848) -> (13.1572, -149.9848) projected
  line L40 (13.1572, -149.9848) -> (13.1572, -153.1598) projected
  line L41 (13.1572, -153.1598) -> (29.9212, -153.1598) projected
  line L42 (29.9212, -153.1598) -> (29.9212, -149.9848) projected
  line L43 (43.0784, -149.9848) -> (29.9212, -149.9848) projected
  line L44 (43.0784, -149.9848) -> (43.0784, -152.624) projected
  line L45 (43.0784, -152.624) -> (0, -152.624) projected
  line L46 (0, -153.1598) -> (43.0784, -153.1598)
  line L47 (43.0784, -153.1598) -> (43.0784, 7.4417)
  line L48 (43.0784, 7.4417) -> (0, 7.4417)
  line L49 (0, 7.4417) -> (0, -153.1598)
  point P0 (43.0784, -67.7072)
properties part number "flat chain guide" material "Polyethylene, High Density"
